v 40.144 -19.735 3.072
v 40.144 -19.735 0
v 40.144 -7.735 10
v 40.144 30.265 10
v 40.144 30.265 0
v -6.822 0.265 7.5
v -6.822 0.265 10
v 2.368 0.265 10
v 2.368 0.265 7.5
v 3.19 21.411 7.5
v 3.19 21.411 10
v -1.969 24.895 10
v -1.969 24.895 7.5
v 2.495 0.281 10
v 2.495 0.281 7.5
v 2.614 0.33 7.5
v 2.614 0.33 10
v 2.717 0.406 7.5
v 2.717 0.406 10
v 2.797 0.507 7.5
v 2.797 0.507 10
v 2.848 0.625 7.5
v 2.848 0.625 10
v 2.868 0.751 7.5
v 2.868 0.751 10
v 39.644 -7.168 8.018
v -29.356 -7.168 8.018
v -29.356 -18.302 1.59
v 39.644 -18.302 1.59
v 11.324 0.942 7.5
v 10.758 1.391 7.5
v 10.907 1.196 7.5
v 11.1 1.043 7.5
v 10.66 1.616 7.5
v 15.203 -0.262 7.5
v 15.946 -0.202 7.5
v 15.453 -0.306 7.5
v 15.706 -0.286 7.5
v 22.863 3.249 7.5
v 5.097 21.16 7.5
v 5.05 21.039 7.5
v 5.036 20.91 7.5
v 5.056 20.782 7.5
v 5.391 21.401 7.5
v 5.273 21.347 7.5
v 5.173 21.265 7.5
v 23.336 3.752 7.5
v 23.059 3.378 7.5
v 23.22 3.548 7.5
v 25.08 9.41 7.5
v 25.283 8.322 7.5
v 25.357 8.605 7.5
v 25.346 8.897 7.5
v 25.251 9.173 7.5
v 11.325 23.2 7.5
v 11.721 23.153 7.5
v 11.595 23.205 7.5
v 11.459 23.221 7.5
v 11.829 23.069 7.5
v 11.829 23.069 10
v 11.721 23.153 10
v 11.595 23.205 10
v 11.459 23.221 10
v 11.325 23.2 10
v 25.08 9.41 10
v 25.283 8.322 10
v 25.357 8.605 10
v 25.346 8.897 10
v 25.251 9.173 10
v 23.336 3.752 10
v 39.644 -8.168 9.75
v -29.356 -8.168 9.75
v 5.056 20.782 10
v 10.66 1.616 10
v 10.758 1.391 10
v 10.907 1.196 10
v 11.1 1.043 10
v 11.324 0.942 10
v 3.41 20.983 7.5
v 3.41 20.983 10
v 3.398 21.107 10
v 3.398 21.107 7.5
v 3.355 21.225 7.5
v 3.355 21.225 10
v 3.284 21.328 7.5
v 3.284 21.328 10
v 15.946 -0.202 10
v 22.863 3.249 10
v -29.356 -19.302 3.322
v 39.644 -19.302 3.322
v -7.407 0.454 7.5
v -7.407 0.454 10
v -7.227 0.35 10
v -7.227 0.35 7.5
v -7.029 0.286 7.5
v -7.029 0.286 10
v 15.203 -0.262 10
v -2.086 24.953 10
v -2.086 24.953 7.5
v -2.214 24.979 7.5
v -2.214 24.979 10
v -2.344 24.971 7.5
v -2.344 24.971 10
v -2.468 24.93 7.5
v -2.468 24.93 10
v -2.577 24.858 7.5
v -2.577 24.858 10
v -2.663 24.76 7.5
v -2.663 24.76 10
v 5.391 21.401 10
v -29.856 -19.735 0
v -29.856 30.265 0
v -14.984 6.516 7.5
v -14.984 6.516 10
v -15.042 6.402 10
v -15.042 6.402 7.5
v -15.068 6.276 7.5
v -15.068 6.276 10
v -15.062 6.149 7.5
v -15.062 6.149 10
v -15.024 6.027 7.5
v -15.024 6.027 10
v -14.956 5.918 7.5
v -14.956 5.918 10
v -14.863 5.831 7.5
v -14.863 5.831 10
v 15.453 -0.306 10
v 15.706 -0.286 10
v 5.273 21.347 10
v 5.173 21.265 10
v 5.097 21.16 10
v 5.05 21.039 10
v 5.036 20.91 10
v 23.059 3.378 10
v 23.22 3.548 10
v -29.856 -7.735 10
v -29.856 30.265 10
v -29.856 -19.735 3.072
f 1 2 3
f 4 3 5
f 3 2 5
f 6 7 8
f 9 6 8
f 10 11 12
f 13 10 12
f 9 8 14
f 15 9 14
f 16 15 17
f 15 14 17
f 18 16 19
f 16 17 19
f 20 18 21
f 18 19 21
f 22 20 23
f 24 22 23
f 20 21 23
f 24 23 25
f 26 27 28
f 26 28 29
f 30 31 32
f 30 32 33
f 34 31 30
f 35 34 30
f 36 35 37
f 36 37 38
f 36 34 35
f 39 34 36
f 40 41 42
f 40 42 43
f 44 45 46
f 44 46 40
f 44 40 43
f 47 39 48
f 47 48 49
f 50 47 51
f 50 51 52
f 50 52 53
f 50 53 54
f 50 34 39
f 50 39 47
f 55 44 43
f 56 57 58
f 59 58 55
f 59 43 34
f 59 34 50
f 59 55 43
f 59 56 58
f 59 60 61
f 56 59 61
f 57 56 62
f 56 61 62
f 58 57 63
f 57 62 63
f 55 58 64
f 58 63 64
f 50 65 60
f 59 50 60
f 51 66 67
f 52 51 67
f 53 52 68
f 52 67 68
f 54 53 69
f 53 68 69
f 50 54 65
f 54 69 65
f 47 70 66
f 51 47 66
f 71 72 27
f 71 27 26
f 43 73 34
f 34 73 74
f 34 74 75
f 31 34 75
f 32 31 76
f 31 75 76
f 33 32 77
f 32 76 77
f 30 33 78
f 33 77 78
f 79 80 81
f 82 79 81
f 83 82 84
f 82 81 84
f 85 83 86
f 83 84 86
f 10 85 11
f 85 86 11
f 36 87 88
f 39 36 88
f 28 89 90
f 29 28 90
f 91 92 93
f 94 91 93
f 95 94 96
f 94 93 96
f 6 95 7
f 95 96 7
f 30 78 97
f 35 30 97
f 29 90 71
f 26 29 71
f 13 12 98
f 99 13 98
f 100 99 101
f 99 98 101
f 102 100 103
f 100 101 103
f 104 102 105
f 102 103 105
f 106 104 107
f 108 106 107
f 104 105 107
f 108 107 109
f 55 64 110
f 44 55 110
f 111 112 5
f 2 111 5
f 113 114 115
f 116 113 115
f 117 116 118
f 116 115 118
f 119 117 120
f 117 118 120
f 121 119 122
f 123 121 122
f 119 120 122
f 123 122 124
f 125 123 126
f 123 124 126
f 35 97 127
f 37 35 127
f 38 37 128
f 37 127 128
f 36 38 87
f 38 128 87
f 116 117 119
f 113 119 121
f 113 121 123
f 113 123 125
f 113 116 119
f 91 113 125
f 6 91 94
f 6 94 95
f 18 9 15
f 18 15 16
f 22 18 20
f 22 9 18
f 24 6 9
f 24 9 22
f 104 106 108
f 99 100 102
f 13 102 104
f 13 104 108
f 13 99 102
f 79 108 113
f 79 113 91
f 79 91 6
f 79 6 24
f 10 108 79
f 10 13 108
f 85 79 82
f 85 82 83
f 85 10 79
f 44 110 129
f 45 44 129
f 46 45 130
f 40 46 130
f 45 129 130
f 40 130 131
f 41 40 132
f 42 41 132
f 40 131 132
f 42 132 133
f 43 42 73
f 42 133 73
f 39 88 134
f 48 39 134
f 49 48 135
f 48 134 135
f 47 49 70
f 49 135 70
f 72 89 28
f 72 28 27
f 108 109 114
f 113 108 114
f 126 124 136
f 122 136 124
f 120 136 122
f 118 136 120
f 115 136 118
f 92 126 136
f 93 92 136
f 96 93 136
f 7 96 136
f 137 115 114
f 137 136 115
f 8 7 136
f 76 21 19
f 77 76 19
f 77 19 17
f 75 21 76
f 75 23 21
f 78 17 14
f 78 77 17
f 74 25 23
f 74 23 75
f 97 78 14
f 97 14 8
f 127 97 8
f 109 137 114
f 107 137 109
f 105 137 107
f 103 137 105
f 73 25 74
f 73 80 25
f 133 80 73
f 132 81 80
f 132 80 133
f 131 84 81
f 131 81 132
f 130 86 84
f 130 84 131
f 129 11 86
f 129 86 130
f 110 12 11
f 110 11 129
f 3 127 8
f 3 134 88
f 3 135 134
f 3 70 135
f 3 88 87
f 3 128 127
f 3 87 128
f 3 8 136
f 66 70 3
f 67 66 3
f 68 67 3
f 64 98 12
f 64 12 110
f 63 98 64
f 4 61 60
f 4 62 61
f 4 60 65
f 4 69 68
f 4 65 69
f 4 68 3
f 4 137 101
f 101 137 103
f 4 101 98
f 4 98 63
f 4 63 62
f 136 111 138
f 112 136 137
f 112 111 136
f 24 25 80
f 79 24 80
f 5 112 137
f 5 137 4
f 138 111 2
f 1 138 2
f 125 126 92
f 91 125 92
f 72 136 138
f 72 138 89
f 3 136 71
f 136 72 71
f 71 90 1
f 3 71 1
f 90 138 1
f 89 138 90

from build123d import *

# Parameters (mm, degrees)
F0_W     = 70
F0_H     = 50
F1_DEPTH = 10
F2_SIZE2 = 6.9282032303
F2_SIZE  = 12
F4_DEPTH = 2.5
F5_W     = 69
F5_H     = 12.8564064606
F6_DEPTH = 2


with BuildPart() as f1:
    # F0 (on Top) → F1 (new body)
    with BuildSketch(Plane.XY):
        with Locations((5.1442100421, 5.2647431195)):
            Rectangle(F0_W, F0_H)
    extrude(amount=F1_DEPTH)

    # F2
    f2_edges = [f1.edges().sort_by_distance(p)[0] for p in [
        (5.14421, -19.735257, 10),
    ]]
    f2_side = f1.faces().sort_by_distance((5.14421, 5.264743, 10))[0]
    chamfer(f2_edges, length=F2_SIZE, length2=F2_SIZE2, reference=f2_side)

    # F3 (on face) → F4 (cut)
    with BuildSketch(Plane.XY.offset(10)):
        with BuildLine():
            ThreePointArc((-1.969263475, 24.8949940758), (-2.3442214304, 24.9714998994), (-2.66345453, 24.7604623731))
            Line((-2.66345453, 24.7604623731), (-14.9844594162, 6.5159764986))
            ThreePointArc((-14.9844594162, 6.5159764986), (-15.0623736344, 6.1485983412), (-14.8625708975, 5.830610602))
            Line((-14.8625708975, 5.830610602), (-7.4070282086, 0.4536706786))
            ThreePointArc((-7.4070282086, 0.4536706786), (-7.1294320931, 0.3131464505), (-6.8220824883, 0.2647431195))
            Line((-6.8220824883, 0.2647431195), (2.3681526499, 0.2647431195))
            ThreePointArc((2.3681526499, 0.2647431195), (2.7169388104, 0.4064859293), (2.8679732491, 0.7513502623))
            Line((2.8679732491, 0.7513502623), (3.410086475, 20.9829822828))
            ThreePointArc((3.410086475, 20.9829822828), (3.3549084959, 21.2250516372), (3.190095552, 21.4107365189))
            Line((3.190095552, 21.4107365189), (-1.969263475, 24.8949940758))
        make_face()
        with BuildLine():
            ThreePointArc((11.8286107336, 23.0692653505), (11.5949478981, 23.2051710927), (11.3246932103, 23.1995947829))
            Line((11.3246932103, 23.1995947829), (5.3912275031, 21.4008405723))
            ThreePointArc((5.3912275031, 21.4008405723), (5.0965360899, 21.1602954599), (5.0563803582, 20.7820197704))
            Line((5.0563803582, 20.7820197704), (10.6604367749, 1.6164084942))
            ThreePointArc((10.6604367749, 1.6164084942), (10.9073063674, 1.195834103), (11.3237327707, 0.9420301136))
            Line((11.3237327707, 0.9420301136), (15.2026586897, -0.2622863149))
            ThreePointArc((15.2026586897, -0.2622863149), (15.579956303, -0.3039895341), (15.9456136146, -0.2020710473))
            Line((15.9456136146, -0.2020710473), (22.8627626989, 3.249037371))
            ThreePointArc((22.8627626989, 3.249037371), (23.1443824723, 3.4583377212), (23.3363661018, 3.7520358986))
            Line((23.3363661018, 3.7520358986), (25.2827025924, 8.3223486347))
            ThreePointArc((25.2827025924, 8.3223486347), (25.3458081315, 8.896965521), (25.0803776052, 9.4104959591))
            Line((25.0803776052, 9.4104959591), (11.8286107336, 23.0692653505))
        make_face()
    extrude(amount=-F4_DEPTH, mode=Mode.SUBTRACT)

    # F5 (on face) → F6 (cut)
    with BuildSketch(Plane(origin=(0, -6.2639412391, 10.8494644817), x_dir=(1, 0, 0), z_dir=(0, -0.5, 0.8660254038))):
        with Locations((5.1442100421, -8.6271321936)):
            Rectangle(F5_W, F5_H)
    extrude(amount=-F6_DEPTH, mode=Mode.SUBTRACT)


solid = f1.part
